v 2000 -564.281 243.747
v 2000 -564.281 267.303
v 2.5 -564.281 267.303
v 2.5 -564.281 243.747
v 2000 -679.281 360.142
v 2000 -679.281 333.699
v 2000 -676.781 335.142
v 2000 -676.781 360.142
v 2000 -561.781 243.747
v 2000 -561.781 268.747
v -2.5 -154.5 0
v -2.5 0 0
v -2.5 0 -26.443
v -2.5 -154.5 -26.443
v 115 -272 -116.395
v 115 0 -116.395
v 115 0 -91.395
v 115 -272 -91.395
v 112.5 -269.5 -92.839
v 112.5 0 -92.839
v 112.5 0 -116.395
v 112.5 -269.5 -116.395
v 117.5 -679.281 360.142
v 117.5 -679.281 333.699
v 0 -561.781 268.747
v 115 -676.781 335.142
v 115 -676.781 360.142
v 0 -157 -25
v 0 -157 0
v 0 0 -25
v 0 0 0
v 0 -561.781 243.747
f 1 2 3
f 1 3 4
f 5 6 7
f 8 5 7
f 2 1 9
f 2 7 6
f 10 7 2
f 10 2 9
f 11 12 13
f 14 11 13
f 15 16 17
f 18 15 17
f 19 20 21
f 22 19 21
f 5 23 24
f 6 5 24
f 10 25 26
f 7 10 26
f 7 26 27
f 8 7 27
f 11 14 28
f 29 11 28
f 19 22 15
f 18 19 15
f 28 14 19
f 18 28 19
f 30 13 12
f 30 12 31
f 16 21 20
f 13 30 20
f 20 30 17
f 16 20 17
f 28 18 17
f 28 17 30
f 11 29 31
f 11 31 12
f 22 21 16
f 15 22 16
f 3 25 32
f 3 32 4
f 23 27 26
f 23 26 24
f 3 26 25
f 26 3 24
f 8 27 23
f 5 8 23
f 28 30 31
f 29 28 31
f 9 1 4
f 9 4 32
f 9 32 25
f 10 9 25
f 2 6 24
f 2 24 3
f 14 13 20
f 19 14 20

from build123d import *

# Parameters (mm, degrees)
F1_DEPTH = 272
F3_DEPTH = 116.396281
F5_DEPTH = 2000
F7_DEPTH = 476.538413
F9_DEPTH = 116.396281


with BuildPart() as f1:
    # F0 (on Front) → F1 (new body)
    with BuildSketch(Plane.XZ):
        Polygon((0, -25), (0, 0), (-2.5, 0), (-2.5, -26.443376), (112.5, -92.838657), (112.5, -116.395281), (115, -116.395281), (115, -91.395281), align=None)
    extrude(amount=F1_DEPTH)

    # F2 (on face) → F3 (cut, through all)
    with BuildSketch(Plane(origin=(0, 0, -116.395281), x_dir=(1, 0, 0), z_dir=(0, 0, -1))):
        Polygon((-2.5, 154.5), (112.5, 269.5), (112.5, 272), (-2.5, 272), align=None)
    extrude(amount=-F3_DEPTH, mode=Mode.SUBTRACT)

    # F6 (on face) → F7 (cut, through all)
    with BuildSketch(Plane(origin=(0, 0, -116.395281), x_dir=(1, 0, 0), z_dir=(0, 0, -1))):
        Polygon((112.5, 269.5), (115, 272), (112.5, 272), align=None)
    extrude(amount=-F7_DEPTH, mode=Mode.SUBTRACT)


with BuildPart() as f5:
    # F4 (on Right) → F5 (new body)
    with BuildSketch(Plane.YZ):
        Polygon((-676.780546, 335.142132), (-676.780546, 360.142132), (-679.280546, 360.142132), (-679.280546, 333.698756), (-564.280546, 267.303475), (-564.280546, 243.746851), (-561.780546, 243.746851), (-561.780546, 268.746851), align=None)
    extrude(amount=F5_DEPTH)

    # F8 (on face) → F9 (cut, through all)
    with BuildSketch(Plane(origin=(0, 0, 243.746851), x_dir=(1, 0, 0), z_dir=(0, 0, -1))):
        Polygon((0, 564.280546), (2.5, 564.280546), (117.5, 679.280546), (0, 679.280546), (0, 676.780546), align=None)
        Polygon((0, 564.280546), (0, 561.780546), (2.5, 564.280546), align=None)
    extrude(amount=-F9_DEPTH, mode=Mode.SUBTRACT)


with BuildPart() as f10_1:
    # F10: copy of F1
    add(f1.part)


solid = Compound([f1.part, f5.part])
